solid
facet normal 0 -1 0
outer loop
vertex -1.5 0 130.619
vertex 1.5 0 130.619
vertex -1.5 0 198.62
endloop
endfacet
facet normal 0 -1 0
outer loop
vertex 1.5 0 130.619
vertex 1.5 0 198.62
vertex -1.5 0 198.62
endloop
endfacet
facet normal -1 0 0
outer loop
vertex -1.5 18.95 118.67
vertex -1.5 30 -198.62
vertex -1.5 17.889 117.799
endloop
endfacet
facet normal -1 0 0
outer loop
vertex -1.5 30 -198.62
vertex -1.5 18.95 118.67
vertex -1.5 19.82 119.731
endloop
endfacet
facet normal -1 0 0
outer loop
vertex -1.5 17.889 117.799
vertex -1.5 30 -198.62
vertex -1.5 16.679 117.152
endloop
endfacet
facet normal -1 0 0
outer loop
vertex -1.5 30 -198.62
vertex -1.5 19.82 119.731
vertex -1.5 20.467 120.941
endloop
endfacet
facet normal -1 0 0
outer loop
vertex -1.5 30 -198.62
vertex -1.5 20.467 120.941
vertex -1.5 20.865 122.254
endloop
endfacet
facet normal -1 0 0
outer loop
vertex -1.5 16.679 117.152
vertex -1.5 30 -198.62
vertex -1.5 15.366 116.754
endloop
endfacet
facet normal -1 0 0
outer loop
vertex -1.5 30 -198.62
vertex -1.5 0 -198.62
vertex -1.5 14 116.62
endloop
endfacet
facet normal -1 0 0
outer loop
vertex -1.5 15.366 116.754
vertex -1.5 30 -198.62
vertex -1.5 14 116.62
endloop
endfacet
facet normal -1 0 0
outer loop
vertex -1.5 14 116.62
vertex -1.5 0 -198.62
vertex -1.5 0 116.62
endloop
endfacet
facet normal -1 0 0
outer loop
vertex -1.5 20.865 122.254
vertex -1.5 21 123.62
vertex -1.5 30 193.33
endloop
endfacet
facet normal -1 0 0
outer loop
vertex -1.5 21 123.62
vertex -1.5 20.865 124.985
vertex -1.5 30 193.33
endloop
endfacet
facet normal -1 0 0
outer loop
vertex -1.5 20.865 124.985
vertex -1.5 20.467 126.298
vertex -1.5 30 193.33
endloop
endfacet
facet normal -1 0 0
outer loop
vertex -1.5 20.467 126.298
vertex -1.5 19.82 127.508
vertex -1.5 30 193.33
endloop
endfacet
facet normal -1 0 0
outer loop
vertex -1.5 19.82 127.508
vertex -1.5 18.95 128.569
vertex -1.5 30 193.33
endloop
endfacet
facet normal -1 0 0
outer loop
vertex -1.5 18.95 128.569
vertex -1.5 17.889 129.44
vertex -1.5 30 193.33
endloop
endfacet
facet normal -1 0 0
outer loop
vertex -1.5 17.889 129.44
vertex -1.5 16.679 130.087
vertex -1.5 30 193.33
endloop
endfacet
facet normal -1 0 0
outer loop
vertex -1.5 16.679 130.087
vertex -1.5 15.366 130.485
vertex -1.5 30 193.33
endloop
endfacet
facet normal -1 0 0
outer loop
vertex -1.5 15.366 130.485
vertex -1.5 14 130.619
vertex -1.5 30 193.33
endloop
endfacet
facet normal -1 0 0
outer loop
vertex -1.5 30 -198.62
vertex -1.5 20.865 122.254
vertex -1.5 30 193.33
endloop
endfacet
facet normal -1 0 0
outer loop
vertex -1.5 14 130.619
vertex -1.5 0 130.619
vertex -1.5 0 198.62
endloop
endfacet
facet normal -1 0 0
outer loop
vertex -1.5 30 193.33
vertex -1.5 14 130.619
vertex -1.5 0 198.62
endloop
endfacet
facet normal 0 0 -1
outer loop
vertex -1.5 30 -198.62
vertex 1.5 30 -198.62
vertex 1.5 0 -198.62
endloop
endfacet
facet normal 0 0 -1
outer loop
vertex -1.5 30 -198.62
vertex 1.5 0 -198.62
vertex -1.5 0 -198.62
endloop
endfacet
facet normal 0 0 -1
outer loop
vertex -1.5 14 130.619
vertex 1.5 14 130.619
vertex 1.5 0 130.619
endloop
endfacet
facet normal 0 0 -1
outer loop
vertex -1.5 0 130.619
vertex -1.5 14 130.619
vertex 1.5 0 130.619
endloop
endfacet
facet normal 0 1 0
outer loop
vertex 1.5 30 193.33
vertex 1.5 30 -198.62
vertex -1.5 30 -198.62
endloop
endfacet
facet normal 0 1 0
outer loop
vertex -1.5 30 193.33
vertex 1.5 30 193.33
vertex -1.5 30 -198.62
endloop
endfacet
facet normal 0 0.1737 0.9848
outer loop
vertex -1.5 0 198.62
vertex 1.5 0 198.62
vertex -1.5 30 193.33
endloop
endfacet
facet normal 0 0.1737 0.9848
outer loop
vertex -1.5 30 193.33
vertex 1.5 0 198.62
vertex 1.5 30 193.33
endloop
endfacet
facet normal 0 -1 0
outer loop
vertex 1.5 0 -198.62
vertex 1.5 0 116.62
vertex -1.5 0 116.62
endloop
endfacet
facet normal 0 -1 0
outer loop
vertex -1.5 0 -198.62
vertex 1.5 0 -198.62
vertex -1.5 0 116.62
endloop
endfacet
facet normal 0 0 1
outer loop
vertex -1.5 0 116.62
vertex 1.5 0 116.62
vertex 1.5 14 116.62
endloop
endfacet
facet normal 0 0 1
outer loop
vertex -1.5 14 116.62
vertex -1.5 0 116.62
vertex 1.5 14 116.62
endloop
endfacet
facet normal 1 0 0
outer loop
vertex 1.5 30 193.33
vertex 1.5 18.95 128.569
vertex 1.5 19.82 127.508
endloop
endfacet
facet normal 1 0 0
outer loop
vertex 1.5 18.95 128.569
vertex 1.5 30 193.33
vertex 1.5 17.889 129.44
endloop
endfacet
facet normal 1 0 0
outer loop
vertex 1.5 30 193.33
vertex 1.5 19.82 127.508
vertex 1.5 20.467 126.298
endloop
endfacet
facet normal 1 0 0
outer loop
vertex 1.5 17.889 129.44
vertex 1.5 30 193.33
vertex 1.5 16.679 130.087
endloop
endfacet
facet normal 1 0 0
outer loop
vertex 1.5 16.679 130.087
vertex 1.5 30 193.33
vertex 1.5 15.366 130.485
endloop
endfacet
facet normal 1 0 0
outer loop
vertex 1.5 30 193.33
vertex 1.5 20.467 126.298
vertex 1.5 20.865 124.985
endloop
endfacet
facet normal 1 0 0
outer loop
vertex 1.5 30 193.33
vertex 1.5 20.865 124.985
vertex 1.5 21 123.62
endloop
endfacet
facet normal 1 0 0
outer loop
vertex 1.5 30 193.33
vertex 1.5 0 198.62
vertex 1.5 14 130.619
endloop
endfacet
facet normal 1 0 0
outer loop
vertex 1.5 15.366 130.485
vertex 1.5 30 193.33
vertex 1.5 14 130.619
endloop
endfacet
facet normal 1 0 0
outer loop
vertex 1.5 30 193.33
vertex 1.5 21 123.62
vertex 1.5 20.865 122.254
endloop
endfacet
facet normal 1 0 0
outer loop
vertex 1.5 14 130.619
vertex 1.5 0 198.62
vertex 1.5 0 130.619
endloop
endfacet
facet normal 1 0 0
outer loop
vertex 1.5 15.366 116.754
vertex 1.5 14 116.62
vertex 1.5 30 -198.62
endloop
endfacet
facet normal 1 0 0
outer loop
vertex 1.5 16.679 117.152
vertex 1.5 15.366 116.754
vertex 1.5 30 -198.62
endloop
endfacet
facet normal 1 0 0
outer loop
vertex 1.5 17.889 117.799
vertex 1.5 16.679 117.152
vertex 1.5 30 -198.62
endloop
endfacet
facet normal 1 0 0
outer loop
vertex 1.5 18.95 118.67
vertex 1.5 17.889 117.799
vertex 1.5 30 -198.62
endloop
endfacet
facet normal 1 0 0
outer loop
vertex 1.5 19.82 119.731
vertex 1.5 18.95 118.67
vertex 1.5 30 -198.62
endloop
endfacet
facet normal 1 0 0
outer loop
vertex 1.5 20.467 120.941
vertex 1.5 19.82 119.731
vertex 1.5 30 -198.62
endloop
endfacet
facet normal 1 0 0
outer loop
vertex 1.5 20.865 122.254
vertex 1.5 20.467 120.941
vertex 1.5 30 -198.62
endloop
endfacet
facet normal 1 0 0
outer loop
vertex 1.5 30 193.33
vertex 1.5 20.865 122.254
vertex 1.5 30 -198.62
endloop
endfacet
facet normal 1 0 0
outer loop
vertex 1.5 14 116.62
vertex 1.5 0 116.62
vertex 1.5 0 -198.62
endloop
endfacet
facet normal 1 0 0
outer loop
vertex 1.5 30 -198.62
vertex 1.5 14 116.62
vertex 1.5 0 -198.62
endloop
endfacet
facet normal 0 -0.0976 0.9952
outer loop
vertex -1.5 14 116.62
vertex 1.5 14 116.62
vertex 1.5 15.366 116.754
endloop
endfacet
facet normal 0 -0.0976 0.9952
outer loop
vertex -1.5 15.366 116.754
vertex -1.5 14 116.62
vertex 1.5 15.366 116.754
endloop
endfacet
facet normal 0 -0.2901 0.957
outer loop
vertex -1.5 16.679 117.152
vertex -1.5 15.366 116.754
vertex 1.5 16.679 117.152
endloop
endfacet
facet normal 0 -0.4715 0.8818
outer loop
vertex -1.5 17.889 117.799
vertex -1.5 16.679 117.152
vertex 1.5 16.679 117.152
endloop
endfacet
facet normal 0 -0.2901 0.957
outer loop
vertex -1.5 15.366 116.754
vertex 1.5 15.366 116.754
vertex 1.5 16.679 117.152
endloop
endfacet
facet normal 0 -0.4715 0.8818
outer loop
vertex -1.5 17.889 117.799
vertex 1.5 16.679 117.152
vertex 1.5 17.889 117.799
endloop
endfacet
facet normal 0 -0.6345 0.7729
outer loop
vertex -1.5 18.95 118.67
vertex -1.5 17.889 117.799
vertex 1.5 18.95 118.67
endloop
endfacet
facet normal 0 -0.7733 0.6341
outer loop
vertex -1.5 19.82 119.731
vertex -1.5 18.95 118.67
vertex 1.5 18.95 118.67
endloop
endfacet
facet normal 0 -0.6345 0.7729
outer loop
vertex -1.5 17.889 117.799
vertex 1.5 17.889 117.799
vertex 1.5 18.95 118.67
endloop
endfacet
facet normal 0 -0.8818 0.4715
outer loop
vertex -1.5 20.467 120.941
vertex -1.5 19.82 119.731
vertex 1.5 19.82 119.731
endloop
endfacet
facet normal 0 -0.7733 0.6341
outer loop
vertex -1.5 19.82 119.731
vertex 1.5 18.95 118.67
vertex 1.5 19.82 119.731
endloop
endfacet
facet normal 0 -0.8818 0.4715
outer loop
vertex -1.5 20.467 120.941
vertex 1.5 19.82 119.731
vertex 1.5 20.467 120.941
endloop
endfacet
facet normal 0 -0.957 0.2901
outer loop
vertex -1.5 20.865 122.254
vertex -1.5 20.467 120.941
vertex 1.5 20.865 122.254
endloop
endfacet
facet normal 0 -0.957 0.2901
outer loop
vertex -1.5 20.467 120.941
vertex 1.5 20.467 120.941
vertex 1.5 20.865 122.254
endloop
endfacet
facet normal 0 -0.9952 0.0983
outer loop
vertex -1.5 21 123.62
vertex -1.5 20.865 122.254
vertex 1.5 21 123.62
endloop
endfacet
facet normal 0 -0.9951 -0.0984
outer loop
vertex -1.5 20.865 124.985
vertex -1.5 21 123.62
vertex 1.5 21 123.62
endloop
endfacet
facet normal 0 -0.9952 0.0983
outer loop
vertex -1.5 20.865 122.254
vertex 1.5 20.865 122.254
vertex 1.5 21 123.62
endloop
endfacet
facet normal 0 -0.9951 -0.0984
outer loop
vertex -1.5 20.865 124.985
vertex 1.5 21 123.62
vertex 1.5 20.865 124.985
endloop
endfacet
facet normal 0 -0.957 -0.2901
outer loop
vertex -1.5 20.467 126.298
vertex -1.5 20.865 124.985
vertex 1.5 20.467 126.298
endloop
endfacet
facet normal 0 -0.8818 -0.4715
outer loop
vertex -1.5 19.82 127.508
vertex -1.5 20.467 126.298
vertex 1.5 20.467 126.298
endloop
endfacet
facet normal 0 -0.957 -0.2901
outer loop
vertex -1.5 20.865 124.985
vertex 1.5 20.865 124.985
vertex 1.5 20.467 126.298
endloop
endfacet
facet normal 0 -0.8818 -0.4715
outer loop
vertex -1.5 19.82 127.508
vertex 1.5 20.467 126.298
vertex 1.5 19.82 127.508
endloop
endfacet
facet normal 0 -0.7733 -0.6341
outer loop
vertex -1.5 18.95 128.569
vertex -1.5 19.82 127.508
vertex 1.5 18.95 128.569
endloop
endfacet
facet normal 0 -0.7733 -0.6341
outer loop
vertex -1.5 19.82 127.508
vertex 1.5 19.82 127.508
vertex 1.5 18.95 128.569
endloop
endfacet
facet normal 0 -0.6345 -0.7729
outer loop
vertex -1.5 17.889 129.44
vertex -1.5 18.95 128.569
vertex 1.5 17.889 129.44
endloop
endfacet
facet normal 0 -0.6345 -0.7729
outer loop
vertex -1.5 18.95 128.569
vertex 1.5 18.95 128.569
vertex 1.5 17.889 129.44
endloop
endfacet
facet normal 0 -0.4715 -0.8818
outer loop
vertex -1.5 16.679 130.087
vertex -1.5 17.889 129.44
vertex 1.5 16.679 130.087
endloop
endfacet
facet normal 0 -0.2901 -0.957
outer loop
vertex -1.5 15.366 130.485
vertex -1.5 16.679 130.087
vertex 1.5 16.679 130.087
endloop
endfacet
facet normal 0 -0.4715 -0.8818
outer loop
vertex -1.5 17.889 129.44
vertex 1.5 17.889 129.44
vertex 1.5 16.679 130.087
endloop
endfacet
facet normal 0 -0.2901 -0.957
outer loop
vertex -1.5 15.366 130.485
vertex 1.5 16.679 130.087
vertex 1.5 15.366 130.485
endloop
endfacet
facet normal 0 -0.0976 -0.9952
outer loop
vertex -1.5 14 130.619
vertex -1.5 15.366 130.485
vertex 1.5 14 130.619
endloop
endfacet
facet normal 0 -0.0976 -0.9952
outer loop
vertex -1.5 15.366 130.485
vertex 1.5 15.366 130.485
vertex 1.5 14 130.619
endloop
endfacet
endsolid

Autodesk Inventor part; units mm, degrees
ref_plane "YZ Plane" through (0, 0, 0) normal (1, 0, 0) x (0, 1, 0)
ref_plane "XZ Plane" through (0, 0, 0) normal (0, 1, 0) x (-1, 0, 0)
ref_plane "XY Plane" through (0, 0, 0) normal (0, 0, 1) x (1, 0, 0)
sketch "Sketch2" plane through (0, 0, 0) normal (0, 1, 0) x (-1, 0, 0)
  line L0 (-1.5, -198.6195) -> (1.5, -198.6195)
  line L1 (1.5, -198.6195) -> (1.5, 198.6195)
  line L2 (1.5, 198.6195) -> (-1.5, 198.6195)
  line L3 (-1.5, 198.6195) -> (-1.5, -198.6195)
  line L4 (-1.5, -198.6195) -> (1.5, 198.6195) construction
  line L5 (1.5, -198.6195) -> (-1.5, 198.6195) construction
  point P0 (0, 0)
  dimension "d0" = 3
  dimension "d1" = 397.239
extrude "Extrusion1" add sketch "Sketch2" along normal blind 30
sketch "Sketch3" plane through (1.5, 0, 198.6195) normal (1, 0, 0) x (0, 0, -1)
  line L0 (397.239, 0) -> (0, 0) projected
  line L1 (68, 0) -> (82, 0)
  line L2 (82, 0) -> (82, 14)
  line L3 (68, 14) -> (68, 0)
  arc A0 (82, 14) -> (68, 14) centre (75, 14) ccw
  arc A1 (68, 14) -> (82, 14) centre (75, 14) ccw construction
  line L4 (0, 0) -> (0, 30) projected
  point P0 (198.6195, 0)
  dimension "d4" = 14
  dimension "d5" = 14
  dimension "d6" = 14
  dimension "d9" = 75
extrude "Extrusion2" cut sketch "Sketch3" against normal through all
sketch "Sketch4" plane through (1.5, 0, -198.6195) normal (1, 0, 0) x (0, 0, -1)
  line L0 (-329.239, 0) -> (-397.239, 0) projected
  line L1 (-397.239, 0) -> (-397.239, 30) projected
  line L2 (-397.239, 0) -> (-397.239, 30)
  line L3 (-397.239, 30) -> (-391.9492, 30)
  line L4 (-397.239, 30) -> (0, 30) projected
  line L5 (-397.239, 0) -> (-391.9492, 30)
  point P0 (-198.6195, 0)
  dimension "d10" = 10
extrude "Extrusion3" cut sketch "Sketch4" against normal through all
properties part number "wall-inner-plunger"
